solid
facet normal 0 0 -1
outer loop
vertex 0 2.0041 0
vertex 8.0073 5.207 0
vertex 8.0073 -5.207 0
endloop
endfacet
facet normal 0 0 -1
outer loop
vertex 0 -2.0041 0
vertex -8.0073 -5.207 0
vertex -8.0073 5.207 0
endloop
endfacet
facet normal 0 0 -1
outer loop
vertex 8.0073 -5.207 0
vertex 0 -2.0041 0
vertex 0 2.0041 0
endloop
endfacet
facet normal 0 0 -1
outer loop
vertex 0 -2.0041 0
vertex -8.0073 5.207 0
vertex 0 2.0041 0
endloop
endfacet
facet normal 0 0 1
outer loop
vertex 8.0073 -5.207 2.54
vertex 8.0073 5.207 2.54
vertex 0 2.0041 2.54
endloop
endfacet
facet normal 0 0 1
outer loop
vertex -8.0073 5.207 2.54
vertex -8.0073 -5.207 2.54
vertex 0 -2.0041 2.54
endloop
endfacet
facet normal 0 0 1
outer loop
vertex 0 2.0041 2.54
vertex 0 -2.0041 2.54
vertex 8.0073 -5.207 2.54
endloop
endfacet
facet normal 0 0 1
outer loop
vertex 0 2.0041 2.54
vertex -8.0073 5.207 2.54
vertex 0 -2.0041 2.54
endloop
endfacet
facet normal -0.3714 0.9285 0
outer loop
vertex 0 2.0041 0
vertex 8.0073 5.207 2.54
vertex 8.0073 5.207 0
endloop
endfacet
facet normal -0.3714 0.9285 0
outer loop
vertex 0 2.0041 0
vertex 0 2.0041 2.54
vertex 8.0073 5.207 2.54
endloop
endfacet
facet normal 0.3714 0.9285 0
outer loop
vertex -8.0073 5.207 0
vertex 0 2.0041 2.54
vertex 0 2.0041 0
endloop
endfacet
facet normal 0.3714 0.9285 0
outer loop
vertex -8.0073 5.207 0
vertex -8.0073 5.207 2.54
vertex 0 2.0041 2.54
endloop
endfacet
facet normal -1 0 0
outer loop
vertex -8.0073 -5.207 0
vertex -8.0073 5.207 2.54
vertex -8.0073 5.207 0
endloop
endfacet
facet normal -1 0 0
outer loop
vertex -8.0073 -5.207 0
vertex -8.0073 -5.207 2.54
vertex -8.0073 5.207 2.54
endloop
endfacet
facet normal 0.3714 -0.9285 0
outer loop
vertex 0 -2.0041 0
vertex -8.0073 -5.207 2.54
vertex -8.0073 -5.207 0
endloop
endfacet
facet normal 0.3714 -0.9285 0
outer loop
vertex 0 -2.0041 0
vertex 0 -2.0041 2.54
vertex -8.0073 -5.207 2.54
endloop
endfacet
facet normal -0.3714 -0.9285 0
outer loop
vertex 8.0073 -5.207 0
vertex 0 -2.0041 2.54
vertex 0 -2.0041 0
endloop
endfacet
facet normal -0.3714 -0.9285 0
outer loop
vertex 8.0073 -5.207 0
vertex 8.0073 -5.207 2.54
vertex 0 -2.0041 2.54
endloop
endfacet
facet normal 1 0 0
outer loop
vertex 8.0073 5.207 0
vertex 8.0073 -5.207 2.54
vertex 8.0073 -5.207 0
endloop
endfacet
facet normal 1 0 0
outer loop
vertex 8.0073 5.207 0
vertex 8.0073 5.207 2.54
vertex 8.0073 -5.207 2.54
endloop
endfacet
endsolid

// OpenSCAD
ViewScale = [0.0254, 0.0254, 0.0254];


circumcenter_d = function (a,b,c) 2*((a[0]*(b[1]-c[1])) + (b[0]*(c[1]-a[1])) + (c[0]*(a[1]-b[1])));
circumcenter_x = function (a,b,c) (1/circumcenter_d(a,b,c)) *
    (((pow(a[0],2) + pow(a[1],2))*(b[1]-c[1])) +
    ((pow(b[0],2) + pow(b[1],2)) * (c[1]-a[1])) +
    ((pow(c[0],2) + pow(c[1],2)) * (a[1]-b[1])));

circumcenter_y = function (a,b,c)  (1/circumcenter_d(a,b,c)) *
    (((pow(a[0],2) + pow(a[1],2))*(c[0]-b[0])) +
    ((pow(b[0],2) + pow(b[1],2)) * (a[0]-c[0])) +
    ((pow(c[0],2) + pow(c[1],2)) * (b[0]-a[0])));


// module circumcenter(a, b, c)
// {
//     d=2*((a[0]*(b[1]-c[1])) + (b[0]*(c[1]-a[1])) + (c[0]*(a[1]-b[1])));
//     x = (1/d) * (((pow(a[0],2) + pow(a[1],2))*(b[1]-c[1])) + ((pow(b[0],2) + pow(b[1],2)) * (c[1]-a[1])) + ((pow(c[0],2) + pow(c[1],2)) * (a[1]-b[1])));
//     y = (1/d) * (((pow(a[0],2) + pow(a[1],2))*(c[0]-b[0])) + ((pow(b[0],2) + pow(b[1],2)) * (a[0]-c[0])) + ((pow(c[0],2) + pow(c[1],2)) * (b[0]-a[0])));
//     echo("X ",x," Y ",y);
//     return x,y;
// }

module template(pad=0)
{
    l=500;
    w=200;
    ofs=100;
    abc=[[0, 0],[l,w],[l,-w]];
    x = circumcenter_x([0, 0],[l,w],[l,-w]);
    y = circumcenter_y([0, 0],[l,w],[l,-w]);
    echo("X ",x," Y ",y);

    translate([ofs, 0, 0])
    scale([pad, pad])
    translate([-x, 0, 0])
    polygon([[0, 0], [l, w], [l, -w]]);

    translate([-ofs, 0, 0])
    rotate([0, 0, 180])
    scale([pad, pad])
    translate([-x, 0, 0])
    polygon([[0, 0], [l, w], [l, -w]]);
}

module ruler(len)
{
    for(ii=[0:200:len]) {
        translate([ii, 0, 0])
        square([100, 100], center=true);
    }
}

module testmount()
{
    linear_extrude(100)
    translate([-250, 0, 0])
    square([500, 1000], center=true);

    translate([0, 0, 99])
    linear_extrude(100)
    translate([-500, 0, 0])
    intersection() {
        difference() {
            template(1.3);
            template(1.1);
        }
        translate([500, 0, 0])
        square([1000, 1000], center=true);
    }
}

module forViewing()
{
    testmount();

    translate([-500, 0, 99])
    linear_extrude(100)
    template(1.0);
//    ruler(1000);
//    difference() {
//        template(1.1);
//        template(1.0);
//    }
}

module forPrinting()
{
    linear_extrude(100)
    template(1.025);
    //testmount();
}

scale(ViewScale)
{
    forPrinting();
   // forViewing();
}
